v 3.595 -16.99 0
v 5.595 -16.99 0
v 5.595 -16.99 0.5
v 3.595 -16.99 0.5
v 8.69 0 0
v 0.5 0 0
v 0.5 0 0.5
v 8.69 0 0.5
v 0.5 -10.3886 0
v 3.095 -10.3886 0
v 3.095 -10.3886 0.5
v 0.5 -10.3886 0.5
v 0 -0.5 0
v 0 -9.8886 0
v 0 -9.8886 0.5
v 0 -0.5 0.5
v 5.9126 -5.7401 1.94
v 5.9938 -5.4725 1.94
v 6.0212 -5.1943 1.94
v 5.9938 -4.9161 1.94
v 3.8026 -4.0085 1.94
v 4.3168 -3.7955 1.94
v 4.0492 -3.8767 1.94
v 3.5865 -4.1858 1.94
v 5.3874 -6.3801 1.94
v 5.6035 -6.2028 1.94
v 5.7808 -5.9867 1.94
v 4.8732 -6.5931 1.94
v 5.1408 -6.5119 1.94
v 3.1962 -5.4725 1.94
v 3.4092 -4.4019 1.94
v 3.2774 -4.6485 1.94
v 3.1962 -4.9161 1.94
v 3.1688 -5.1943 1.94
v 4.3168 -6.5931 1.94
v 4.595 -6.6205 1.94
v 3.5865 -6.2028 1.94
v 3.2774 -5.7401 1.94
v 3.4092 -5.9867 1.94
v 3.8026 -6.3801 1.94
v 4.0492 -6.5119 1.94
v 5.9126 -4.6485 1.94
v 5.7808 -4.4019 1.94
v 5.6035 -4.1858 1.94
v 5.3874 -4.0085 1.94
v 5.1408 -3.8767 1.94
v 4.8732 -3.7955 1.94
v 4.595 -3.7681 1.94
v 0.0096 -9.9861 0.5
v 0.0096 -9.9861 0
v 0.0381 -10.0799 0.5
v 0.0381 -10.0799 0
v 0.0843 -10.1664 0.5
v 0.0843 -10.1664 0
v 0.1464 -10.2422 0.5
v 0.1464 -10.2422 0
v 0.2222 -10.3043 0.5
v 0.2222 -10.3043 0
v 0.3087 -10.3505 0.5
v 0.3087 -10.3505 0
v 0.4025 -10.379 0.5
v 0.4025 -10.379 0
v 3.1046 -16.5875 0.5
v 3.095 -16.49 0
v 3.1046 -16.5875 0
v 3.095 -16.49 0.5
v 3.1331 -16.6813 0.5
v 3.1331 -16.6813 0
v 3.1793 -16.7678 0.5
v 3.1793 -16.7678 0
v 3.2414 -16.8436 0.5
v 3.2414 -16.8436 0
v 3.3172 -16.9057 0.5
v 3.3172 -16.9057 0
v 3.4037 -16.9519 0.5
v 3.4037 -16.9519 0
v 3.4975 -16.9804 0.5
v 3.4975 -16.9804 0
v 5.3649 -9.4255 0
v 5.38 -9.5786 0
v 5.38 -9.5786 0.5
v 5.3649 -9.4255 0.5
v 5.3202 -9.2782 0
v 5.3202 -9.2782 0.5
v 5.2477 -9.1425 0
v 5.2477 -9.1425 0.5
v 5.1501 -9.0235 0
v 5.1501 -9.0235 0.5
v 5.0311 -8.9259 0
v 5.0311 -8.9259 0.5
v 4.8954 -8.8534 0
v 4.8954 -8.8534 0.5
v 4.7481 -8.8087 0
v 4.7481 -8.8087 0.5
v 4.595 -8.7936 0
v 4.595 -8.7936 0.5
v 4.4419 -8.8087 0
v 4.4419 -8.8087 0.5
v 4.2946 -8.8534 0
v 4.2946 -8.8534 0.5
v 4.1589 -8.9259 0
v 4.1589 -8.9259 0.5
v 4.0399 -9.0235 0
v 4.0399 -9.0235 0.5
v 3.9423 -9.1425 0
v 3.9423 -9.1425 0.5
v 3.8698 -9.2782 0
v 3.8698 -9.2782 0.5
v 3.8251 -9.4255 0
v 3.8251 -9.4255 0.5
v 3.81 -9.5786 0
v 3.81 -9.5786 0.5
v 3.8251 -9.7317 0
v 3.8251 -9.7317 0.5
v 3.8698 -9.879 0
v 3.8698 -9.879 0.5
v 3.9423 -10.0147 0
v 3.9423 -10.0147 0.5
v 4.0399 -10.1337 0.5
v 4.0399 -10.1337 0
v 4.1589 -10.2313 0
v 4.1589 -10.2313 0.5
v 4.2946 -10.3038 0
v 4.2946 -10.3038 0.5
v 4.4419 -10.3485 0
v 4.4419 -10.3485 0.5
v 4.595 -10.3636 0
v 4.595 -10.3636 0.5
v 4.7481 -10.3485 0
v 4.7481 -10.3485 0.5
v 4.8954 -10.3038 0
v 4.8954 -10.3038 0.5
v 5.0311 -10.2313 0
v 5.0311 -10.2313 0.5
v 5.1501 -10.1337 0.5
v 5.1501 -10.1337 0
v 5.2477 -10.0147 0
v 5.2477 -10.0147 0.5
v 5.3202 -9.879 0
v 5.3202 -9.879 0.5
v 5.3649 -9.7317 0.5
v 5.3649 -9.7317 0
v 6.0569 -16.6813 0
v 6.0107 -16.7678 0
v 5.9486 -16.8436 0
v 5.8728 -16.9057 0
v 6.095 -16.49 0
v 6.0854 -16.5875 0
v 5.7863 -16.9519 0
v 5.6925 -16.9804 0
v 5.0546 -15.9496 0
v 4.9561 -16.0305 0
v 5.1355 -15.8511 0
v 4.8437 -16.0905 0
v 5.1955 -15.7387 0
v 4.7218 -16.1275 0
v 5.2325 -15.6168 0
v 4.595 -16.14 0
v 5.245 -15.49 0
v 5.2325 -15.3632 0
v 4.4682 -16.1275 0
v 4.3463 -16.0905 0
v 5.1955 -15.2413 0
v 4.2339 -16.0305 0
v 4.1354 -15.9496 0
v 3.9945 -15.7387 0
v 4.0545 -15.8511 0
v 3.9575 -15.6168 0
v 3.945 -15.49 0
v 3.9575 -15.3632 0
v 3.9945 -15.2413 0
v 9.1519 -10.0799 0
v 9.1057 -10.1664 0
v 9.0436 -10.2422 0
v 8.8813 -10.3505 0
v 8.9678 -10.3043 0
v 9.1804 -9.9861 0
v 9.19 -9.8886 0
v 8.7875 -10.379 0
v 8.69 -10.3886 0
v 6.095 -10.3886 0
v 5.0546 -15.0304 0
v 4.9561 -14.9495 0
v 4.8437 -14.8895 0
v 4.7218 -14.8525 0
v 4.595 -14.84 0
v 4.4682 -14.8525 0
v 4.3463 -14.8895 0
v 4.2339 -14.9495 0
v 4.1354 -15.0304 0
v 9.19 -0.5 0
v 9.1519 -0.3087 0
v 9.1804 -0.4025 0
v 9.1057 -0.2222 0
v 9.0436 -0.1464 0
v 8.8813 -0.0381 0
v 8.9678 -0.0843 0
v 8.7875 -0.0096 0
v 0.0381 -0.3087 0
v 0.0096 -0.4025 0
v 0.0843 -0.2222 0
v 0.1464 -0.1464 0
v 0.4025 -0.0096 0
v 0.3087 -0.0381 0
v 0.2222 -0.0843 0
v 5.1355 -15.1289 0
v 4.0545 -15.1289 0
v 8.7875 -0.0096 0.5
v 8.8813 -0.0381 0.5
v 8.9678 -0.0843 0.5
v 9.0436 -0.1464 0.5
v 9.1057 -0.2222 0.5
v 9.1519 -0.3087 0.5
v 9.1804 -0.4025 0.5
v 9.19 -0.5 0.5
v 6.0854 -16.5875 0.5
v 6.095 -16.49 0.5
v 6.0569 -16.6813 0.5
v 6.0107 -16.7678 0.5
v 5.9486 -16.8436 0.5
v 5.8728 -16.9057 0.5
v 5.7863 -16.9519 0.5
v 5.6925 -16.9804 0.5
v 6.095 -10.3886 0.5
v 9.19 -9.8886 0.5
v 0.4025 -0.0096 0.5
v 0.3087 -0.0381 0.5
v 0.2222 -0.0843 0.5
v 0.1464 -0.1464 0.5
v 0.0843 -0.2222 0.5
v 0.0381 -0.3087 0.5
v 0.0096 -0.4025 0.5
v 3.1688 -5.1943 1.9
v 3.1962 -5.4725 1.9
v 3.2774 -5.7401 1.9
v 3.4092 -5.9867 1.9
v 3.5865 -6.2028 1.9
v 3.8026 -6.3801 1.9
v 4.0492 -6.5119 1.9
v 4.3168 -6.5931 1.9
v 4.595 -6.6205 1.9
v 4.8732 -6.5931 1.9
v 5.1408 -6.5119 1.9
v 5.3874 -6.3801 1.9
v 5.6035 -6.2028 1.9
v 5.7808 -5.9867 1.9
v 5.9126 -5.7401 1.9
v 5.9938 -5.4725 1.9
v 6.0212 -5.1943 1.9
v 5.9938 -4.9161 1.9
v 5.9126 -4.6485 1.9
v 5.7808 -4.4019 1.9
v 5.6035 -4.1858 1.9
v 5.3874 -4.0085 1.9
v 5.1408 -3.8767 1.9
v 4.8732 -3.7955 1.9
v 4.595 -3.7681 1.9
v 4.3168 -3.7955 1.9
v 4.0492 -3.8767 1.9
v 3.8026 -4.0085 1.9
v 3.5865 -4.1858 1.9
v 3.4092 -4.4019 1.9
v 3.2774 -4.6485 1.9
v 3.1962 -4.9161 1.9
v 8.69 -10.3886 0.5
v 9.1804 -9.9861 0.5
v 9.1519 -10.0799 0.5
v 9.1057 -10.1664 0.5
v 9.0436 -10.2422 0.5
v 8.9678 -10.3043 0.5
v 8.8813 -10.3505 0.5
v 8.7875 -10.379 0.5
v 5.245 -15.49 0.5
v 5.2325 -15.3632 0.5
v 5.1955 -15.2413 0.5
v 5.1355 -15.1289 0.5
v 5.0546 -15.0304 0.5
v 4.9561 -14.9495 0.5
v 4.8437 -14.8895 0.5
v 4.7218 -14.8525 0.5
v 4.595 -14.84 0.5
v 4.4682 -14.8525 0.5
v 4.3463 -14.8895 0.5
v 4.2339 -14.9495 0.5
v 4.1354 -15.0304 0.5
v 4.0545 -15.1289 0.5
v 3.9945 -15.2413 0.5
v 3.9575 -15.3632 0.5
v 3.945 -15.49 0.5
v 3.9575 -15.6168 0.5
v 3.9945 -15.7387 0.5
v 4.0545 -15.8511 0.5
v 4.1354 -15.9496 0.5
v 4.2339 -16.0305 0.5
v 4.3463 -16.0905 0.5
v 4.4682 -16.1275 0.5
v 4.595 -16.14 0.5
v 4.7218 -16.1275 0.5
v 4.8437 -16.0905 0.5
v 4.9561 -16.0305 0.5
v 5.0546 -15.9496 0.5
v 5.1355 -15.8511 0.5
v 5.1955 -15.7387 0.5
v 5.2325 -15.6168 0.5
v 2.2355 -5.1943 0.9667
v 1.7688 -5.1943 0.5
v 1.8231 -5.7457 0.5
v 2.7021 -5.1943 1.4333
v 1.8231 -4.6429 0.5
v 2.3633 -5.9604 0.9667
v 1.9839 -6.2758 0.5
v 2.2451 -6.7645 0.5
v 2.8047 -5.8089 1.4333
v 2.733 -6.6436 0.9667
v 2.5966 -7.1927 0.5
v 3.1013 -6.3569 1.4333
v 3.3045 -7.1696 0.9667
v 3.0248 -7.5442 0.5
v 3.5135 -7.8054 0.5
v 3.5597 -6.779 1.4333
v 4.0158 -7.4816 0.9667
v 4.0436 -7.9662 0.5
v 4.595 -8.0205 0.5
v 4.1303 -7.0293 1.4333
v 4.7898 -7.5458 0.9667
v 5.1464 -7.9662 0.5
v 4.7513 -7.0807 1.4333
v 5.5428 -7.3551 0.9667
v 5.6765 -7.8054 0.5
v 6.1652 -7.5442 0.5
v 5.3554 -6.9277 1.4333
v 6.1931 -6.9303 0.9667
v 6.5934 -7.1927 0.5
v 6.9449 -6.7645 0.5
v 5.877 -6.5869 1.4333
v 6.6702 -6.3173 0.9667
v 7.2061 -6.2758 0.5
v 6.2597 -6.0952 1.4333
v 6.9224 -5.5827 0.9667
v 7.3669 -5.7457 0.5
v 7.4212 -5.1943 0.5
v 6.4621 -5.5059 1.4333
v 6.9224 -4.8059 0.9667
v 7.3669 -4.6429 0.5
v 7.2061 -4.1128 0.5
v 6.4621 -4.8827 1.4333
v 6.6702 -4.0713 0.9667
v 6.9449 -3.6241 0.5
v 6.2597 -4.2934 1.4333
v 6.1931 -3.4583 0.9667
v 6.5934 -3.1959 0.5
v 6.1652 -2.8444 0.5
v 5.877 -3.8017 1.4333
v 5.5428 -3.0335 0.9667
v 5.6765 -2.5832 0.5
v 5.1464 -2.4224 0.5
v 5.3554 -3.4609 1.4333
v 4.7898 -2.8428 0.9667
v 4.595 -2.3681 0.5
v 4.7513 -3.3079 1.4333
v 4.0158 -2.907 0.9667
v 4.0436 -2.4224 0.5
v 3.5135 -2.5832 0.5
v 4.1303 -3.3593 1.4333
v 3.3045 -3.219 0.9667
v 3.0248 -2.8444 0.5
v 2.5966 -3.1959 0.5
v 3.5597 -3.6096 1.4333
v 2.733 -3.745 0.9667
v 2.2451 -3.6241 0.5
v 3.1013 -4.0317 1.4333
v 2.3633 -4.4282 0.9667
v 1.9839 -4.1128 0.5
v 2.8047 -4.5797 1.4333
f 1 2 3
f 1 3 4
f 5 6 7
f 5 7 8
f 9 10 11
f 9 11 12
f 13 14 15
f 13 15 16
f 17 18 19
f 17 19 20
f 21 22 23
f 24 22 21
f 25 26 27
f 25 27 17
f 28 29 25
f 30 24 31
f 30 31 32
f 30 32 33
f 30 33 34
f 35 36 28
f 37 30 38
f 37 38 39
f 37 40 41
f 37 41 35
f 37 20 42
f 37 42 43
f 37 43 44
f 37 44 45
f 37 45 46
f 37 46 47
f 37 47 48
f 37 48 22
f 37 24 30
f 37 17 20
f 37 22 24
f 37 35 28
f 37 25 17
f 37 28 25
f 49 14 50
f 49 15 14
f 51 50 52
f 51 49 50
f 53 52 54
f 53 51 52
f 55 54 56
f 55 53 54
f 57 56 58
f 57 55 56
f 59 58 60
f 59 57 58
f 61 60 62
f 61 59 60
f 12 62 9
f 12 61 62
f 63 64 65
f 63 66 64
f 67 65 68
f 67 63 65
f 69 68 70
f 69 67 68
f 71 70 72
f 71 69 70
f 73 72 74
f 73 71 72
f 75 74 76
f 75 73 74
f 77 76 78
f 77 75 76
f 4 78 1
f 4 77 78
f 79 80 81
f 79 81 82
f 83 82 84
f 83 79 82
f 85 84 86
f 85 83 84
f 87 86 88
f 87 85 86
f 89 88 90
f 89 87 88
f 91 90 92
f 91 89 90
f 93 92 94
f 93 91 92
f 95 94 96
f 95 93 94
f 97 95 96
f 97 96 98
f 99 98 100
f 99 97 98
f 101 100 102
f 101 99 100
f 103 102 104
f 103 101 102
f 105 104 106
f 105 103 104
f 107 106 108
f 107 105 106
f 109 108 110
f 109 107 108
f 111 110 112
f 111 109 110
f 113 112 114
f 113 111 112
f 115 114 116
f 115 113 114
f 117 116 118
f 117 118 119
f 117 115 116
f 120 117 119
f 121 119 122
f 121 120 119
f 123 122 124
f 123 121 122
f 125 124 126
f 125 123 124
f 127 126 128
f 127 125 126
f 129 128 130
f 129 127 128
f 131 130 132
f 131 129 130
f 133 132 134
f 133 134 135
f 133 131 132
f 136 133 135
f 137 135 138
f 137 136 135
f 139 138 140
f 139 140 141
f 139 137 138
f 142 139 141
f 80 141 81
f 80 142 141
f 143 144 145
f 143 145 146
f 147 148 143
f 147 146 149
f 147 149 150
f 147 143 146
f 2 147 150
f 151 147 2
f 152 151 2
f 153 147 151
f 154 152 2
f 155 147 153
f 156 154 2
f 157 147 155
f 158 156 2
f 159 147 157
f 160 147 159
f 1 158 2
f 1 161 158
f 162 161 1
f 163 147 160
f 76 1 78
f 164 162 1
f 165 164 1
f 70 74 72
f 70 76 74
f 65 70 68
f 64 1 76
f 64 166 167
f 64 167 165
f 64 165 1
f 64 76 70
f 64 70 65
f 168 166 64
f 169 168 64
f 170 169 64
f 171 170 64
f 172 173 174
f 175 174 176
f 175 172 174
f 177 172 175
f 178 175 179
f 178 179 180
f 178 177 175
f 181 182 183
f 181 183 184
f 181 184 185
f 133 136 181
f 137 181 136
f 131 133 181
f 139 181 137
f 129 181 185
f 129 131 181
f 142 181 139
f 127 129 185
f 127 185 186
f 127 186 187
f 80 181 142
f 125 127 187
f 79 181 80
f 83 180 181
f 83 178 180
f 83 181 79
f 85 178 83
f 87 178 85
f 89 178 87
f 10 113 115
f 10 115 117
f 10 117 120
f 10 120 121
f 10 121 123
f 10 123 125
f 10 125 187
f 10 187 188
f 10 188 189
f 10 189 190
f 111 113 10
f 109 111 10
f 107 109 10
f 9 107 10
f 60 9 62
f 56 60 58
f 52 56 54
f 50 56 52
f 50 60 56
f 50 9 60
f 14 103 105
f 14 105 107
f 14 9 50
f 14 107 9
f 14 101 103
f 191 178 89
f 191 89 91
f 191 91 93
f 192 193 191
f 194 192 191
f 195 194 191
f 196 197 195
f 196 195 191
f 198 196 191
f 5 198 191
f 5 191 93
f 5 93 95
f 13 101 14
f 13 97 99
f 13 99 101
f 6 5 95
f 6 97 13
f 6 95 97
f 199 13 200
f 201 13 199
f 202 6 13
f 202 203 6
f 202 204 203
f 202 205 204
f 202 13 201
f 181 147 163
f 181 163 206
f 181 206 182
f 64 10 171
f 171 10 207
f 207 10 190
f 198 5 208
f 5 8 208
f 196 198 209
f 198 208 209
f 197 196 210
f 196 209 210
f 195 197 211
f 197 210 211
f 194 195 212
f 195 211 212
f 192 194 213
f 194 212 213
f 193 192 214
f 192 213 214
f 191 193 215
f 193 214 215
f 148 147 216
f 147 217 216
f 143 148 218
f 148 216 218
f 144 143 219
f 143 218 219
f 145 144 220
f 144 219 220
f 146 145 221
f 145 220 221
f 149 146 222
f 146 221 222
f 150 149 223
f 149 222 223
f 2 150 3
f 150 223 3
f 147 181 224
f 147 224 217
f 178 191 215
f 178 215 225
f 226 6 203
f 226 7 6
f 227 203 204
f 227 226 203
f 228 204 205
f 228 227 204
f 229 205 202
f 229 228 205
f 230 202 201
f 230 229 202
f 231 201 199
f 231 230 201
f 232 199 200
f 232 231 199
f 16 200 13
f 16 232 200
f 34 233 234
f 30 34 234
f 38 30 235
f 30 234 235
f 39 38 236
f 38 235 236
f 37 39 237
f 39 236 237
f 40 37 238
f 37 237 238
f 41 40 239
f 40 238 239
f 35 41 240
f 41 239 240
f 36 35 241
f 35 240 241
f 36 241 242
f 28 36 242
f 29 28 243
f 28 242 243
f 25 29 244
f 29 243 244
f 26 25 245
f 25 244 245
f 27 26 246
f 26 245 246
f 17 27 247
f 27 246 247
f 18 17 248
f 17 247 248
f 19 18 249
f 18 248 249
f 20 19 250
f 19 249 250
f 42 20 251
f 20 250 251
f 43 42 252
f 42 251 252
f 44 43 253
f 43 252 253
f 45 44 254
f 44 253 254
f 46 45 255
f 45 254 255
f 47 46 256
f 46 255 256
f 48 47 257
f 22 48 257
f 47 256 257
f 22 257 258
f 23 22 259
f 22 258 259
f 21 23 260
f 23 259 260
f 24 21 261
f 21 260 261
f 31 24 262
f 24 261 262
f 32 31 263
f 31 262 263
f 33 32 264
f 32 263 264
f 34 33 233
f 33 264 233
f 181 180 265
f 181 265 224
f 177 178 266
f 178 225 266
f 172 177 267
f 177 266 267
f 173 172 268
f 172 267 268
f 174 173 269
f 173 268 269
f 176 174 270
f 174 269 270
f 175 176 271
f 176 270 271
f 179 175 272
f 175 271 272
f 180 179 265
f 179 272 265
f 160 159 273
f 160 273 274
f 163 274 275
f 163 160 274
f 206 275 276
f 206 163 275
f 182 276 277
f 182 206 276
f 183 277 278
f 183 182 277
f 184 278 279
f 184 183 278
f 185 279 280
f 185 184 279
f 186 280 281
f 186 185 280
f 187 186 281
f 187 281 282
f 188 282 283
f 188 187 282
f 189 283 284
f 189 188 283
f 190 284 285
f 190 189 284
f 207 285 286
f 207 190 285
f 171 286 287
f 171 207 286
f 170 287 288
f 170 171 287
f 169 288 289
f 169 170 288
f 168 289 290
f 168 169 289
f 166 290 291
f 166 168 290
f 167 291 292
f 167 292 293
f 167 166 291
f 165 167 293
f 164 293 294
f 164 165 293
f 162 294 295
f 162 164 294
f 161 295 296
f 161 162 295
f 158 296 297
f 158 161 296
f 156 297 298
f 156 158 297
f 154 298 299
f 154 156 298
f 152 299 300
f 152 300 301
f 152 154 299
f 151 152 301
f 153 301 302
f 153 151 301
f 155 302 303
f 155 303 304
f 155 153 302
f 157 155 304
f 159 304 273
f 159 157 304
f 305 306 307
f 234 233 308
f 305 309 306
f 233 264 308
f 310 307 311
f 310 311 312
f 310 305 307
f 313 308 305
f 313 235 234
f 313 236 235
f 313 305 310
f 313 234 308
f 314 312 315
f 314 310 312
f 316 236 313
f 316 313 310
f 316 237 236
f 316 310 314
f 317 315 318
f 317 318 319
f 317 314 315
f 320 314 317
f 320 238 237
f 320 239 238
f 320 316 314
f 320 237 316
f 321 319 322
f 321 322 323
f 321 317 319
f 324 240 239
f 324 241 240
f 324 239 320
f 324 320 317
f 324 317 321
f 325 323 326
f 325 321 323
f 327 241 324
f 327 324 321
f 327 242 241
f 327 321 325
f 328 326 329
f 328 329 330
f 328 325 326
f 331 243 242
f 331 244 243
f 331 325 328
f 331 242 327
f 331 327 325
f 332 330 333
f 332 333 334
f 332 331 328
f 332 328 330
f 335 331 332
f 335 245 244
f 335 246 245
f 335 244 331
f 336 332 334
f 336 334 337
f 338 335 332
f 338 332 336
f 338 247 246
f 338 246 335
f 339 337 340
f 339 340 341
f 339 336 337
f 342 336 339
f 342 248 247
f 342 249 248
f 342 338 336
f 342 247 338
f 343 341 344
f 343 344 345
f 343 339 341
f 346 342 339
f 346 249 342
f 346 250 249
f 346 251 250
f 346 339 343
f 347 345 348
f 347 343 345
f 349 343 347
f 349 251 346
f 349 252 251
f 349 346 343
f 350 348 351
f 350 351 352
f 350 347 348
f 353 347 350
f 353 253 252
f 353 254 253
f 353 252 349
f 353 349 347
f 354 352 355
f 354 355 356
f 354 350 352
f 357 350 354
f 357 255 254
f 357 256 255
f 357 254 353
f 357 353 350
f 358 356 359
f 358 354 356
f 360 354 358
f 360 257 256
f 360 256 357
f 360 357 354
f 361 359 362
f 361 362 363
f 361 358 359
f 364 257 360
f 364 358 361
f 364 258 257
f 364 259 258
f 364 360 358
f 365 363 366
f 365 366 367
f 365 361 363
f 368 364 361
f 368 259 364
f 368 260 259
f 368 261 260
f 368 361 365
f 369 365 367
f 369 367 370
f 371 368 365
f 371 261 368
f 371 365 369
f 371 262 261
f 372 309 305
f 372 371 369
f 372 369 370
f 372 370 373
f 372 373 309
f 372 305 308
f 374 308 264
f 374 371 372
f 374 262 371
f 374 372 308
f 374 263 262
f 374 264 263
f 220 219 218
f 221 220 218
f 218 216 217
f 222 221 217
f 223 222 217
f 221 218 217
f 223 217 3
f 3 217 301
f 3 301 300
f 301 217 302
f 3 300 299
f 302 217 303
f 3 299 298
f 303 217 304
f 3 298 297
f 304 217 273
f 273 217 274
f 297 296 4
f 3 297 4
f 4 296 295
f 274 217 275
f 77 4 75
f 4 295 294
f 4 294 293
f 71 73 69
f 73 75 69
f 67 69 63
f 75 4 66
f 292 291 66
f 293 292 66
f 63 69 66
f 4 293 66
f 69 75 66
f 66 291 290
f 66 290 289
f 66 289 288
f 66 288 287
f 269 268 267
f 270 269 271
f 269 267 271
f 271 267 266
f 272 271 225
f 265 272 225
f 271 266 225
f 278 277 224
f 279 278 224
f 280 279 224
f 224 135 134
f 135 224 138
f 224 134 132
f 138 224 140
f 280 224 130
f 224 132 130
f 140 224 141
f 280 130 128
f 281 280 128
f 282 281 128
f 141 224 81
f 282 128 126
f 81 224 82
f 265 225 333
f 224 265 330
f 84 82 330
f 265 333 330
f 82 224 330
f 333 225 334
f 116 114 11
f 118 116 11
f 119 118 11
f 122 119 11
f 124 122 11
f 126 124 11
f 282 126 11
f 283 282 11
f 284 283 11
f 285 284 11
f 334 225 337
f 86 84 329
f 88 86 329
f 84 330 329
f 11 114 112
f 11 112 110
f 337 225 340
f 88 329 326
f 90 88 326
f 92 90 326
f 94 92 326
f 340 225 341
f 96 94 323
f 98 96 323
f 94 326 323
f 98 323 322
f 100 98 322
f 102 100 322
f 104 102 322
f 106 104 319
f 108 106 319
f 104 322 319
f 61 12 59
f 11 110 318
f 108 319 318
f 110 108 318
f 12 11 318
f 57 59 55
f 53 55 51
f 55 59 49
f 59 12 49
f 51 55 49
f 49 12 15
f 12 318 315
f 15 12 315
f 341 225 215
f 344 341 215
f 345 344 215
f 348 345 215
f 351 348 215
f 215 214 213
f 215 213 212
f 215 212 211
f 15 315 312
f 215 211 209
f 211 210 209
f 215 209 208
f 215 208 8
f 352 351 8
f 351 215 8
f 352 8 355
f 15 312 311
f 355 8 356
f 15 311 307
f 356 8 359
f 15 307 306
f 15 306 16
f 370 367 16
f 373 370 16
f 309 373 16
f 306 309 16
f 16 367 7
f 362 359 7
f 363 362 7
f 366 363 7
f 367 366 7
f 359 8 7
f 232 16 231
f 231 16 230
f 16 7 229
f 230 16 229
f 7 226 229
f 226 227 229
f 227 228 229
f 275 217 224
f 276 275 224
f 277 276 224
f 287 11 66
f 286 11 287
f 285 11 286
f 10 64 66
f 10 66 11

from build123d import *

# Parameters (mm, degrees)
SKETCH1_R           = 0.65
SKETCH1_R_2         = 0.785
BOSS_EXTRUDE1_DEPTH = 0.5
FILLET1_R           = 0.5
SKETCH6_R           = 1.426206797
BOSS_EXTRUDE3_DEPTH = 1.44
CHAMFER1_SIZE       = 1.4


with BuildPart() as part:
    # Sketch1 → Boss-Extrude1 (new body)
    with BuildSketch(Plane.XY):
        Polygon((0, 0), (9.19, 0), (9.19, -10.3886), (6.095, -10.3886), (6.095, -16.99), (3.095, -16.99), (3.095, -10.3886), (0, -10.3886), align=None)
        with Locations((4.595, -15.49)):
            Circle(SKETCH1_R, mode=Mode.SUBTRACT)
        with Locations((4.595, -9.5786)):
            Circle(SKETCH1_R_2, mode=Mode.SUBTRACT)
    extrude(amount=BOSS_EXTRUDE1_DEPTH)

    # Fillet1
    fillet1_edges = [part.edges().sort_by_distance(p)[0] for p in [
        (9.19, -10.3886, 0.25),
        (0, 0, 0.25),
        (9.19, 0, 0.25),
        (6.095, -16.99, 0.25),
        (3.095, -16.99, 0.25),
        (0, -10.3886, 0.25),
    ]]
    fillet(fillet1_edges, radius=FILLET1_R)

    # Sketch6 → Boss-Extrude3 (add)
    with BuildSketch(Plane.XY.offset(0.5)):
        with Locations((4.595, -5.1943)):
            Circle(SKETCH6_R)
    extrude(amount=BOSS_EXTRUDE3_DEPTH)

    # Chamfer1
    chamfer1_edges = [part.edges().sort_by_distance(p)[0] for p in [
        (3.168793203, -5.1943, 0.5),
    ]]
    chamfer(chamfer1_edges, length=CHAMFER1_SIZE)


solid = part.part
